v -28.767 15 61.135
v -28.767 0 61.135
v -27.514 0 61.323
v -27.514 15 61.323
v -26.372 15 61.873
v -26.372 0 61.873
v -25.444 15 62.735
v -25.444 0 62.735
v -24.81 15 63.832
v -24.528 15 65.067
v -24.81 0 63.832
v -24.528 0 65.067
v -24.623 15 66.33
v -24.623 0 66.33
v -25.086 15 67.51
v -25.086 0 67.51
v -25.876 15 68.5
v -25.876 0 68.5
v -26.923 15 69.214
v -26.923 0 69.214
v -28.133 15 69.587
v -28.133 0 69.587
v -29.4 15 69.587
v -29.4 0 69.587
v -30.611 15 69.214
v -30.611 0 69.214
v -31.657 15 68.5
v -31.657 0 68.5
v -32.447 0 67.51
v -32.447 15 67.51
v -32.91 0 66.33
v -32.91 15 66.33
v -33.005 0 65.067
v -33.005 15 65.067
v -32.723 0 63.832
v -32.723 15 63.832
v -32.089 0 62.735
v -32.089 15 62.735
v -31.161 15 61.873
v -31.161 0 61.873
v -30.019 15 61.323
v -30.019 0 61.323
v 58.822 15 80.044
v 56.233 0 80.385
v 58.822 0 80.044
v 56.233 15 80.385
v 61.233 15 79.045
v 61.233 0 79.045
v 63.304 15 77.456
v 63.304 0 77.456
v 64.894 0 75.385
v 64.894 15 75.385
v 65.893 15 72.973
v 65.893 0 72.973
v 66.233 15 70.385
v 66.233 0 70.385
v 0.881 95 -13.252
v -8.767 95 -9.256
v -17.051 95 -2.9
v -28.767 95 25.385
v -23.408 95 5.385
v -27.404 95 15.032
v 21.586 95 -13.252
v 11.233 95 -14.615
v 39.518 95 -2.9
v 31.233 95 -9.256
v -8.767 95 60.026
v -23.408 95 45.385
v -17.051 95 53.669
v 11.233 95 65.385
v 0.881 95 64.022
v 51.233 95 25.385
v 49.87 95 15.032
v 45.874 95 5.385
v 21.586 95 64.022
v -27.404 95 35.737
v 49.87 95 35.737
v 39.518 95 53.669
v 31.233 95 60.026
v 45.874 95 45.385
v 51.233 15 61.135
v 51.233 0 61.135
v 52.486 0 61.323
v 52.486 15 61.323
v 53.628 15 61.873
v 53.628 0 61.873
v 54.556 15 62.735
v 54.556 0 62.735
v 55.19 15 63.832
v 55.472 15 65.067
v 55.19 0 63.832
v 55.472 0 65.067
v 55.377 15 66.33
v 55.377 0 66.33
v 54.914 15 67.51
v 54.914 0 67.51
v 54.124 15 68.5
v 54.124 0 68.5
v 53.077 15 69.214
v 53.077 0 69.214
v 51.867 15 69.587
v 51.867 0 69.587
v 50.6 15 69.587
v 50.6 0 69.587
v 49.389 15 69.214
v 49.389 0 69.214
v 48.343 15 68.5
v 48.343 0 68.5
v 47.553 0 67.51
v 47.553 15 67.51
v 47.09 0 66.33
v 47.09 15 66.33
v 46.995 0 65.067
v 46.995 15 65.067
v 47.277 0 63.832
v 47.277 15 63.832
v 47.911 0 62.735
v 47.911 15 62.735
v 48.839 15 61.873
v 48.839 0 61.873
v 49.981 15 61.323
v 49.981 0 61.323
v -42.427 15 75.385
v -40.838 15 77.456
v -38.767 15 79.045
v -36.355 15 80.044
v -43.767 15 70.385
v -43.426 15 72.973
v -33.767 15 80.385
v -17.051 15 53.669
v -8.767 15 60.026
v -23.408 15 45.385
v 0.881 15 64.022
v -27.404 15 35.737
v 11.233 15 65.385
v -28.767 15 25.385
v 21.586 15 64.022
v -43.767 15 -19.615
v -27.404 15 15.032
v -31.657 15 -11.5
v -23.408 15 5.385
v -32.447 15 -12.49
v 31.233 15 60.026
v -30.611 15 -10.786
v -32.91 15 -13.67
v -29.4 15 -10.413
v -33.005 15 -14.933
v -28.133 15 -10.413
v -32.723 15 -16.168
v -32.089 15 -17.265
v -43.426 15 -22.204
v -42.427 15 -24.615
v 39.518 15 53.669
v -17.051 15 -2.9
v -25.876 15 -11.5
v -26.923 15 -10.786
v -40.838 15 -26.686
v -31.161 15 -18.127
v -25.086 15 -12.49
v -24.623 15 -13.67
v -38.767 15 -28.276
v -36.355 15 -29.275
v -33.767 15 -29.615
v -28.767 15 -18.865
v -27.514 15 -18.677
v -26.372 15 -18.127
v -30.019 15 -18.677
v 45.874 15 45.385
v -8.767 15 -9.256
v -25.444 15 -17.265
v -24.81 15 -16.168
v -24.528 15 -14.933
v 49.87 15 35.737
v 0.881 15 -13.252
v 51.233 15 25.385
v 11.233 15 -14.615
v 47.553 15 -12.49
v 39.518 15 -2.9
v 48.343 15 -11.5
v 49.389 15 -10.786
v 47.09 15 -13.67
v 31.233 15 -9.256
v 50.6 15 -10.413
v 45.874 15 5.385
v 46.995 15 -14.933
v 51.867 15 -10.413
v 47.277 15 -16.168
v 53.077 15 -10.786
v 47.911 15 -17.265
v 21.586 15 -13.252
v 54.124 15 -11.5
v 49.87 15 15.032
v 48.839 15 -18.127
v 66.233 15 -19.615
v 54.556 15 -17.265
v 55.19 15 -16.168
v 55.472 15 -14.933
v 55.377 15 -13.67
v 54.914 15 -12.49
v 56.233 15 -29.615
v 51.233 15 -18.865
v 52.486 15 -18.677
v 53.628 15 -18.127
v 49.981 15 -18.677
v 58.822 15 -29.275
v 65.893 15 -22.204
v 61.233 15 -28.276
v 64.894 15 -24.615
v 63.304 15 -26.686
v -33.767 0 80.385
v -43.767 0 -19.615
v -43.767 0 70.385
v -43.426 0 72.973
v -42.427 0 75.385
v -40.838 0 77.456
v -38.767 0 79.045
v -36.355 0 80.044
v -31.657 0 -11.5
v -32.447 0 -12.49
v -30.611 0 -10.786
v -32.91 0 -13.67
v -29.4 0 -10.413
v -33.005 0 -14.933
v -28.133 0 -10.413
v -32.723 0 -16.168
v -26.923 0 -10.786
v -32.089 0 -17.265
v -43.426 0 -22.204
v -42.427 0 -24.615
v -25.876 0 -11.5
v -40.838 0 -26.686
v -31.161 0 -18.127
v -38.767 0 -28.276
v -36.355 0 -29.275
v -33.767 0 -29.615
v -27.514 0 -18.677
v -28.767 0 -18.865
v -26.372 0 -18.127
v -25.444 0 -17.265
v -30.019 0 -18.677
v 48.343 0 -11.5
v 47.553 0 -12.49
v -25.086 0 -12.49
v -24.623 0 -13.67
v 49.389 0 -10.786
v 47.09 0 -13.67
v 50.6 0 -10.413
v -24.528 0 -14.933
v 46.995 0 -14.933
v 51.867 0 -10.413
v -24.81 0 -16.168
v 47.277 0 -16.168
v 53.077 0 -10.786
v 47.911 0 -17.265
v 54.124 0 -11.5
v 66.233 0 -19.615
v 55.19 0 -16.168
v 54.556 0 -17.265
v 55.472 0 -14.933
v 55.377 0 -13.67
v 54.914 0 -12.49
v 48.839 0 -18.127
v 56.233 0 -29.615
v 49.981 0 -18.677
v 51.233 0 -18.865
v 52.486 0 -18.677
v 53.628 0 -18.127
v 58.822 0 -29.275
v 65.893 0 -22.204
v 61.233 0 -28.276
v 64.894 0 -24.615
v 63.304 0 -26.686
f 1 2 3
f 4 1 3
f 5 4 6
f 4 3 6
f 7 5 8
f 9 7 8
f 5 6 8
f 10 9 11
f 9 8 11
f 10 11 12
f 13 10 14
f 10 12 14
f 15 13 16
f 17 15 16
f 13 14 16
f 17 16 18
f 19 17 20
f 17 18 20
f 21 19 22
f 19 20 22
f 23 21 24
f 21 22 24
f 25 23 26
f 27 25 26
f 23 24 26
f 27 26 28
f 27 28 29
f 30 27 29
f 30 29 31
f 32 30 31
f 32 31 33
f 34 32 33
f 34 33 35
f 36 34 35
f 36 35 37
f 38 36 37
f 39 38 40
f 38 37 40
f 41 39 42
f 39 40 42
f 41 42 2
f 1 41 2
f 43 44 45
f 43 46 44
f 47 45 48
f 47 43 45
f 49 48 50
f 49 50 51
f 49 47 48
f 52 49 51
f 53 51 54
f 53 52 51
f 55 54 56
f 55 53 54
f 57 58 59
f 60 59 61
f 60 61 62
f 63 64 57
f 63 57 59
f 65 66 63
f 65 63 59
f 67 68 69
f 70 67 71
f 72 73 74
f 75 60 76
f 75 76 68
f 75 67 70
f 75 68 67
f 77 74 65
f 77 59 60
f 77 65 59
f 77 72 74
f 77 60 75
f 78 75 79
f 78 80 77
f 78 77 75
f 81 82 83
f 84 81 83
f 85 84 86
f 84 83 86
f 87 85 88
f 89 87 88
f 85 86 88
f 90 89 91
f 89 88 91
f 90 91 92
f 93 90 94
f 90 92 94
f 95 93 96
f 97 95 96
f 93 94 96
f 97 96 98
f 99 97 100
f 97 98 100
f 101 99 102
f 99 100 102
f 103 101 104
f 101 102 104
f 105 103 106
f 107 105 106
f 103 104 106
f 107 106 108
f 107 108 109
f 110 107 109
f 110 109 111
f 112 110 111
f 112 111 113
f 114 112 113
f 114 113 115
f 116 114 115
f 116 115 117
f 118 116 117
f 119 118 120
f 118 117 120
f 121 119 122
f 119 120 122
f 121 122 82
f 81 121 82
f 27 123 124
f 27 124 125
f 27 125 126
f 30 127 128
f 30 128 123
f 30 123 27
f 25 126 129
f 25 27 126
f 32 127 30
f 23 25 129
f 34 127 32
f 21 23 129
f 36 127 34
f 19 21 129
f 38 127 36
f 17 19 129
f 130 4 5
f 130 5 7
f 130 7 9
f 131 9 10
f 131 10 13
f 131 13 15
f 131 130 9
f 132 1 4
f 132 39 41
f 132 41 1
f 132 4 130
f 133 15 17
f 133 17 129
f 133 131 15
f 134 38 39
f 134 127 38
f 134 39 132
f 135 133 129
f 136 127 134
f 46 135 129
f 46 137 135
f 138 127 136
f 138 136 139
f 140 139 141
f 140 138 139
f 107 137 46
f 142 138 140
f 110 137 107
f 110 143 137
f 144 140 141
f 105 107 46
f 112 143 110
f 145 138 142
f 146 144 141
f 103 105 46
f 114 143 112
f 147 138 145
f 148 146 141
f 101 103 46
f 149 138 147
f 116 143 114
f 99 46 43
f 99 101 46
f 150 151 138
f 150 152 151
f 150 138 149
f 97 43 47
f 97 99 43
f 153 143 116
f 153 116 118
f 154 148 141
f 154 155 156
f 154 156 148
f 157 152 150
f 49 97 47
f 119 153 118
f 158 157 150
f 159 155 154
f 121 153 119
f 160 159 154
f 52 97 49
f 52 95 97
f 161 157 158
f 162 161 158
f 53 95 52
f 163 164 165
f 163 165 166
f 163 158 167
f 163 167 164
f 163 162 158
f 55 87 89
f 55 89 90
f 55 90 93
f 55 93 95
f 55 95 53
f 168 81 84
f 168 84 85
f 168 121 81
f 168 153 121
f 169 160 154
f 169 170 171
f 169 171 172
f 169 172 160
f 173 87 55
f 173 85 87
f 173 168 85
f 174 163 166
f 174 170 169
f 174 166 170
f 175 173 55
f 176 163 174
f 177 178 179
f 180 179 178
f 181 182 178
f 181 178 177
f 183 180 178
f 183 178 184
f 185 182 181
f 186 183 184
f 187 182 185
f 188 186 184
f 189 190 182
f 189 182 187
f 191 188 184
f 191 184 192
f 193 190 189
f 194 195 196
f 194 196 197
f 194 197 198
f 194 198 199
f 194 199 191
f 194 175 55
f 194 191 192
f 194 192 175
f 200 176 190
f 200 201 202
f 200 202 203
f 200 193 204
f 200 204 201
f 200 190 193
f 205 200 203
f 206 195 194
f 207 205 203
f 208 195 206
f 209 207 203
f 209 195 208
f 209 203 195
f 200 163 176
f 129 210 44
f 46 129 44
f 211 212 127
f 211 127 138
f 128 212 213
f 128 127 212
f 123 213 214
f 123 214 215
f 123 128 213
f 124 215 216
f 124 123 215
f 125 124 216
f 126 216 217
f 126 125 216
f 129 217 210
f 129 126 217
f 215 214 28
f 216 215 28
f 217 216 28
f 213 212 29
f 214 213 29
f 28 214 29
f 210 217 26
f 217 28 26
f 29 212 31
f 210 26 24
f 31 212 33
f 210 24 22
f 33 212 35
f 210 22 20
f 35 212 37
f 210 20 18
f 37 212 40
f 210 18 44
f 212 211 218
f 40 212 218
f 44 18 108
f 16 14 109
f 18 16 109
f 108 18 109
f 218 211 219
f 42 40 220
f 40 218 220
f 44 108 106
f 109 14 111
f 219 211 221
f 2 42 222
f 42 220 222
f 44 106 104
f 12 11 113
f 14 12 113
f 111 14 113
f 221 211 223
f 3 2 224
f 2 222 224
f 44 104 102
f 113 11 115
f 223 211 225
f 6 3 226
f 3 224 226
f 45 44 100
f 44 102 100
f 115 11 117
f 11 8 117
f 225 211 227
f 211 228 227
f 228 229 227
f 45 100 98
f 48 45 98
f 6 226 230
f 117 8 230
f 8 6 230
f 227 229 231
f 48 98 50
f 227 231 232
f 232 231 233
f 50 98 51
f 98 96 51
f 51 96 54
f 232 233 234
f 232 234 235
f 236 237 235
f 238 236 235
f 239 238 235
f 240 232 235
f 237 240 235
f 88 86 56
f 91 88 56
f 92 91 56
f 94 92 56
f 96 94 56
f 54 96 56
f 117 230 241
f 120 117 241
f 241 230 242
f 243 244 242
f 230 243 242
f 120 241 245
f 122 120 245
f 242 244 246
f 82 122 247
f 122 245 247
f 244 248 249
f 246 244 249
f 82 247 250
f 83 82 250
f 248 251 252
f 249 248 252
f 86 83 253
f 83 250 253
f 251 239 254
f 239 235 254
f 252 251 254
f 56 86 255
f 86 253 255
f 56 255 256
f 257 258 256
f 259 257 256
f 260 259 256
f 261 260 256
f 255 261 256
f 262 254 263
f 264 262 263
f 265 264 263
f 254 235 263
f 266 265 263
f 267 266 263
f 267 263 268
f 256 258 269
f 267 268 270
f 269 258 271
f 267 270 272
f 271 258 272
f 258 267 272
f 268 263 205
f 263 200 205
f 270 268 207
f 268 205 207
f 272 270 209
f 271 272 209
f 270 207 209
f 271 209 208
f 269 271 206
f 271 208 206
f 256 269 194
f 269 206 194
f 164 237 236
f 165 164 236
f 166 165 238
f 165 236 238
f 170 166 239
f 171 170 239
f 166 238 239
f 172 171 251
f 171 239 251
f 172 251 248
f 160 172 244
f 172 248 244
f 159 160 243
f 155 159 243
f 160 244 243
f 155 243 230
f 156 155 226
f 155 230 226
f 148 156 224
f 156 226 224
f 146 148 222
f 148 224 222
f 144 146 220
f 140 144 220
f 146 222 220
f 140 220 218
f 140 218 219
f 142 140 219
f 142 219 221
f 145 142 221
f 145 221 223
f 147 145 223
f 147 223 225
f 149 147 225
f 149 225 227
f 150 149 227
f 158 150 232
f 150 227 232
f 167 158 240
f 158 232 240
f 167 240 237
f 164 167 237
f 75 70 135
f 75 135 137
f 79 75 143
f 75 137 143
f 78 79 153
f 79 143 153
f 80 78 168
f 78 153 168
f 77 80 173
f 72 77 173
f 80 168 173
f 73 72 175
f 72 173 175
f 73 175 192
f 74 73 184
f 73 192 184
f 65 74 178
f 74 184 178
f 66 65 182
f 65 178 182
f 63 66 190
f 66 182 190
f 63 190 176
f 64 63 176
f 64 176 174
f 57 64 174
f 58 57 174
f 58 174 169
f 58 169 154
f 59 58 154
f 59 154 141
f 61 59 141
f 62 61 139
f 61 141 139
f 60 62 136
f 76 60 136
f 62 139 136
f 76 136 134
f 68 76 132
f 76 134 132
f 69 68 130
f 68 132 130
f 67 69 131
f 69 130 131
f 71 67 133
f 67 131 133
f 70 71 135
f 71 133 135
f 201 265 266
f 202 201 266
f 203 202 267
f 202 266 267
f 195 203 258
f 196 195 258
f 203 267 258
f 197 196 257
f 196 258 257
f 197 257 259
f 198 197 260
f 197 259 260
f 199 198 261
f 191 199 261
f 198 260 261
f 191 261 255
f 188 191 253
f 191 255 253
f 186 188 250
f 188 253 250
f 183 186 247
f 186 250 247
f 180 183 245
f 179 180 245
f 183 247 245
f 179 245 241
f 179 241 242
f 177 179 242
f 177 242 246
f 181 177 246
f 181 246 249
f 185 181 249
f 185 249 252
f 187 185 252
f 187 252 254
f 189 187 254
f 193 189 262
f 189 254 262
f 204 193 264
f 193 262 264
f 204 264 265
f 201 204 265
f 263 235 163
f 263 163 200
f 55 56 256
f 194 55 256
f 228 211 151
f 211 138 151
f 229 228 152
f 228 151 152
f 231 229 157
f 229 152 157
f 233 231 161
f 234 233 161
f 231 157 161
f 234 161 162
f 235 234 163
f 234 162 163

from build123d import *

# Parameters (mm, degrees)
SKETCH1_W           = 110
SKETCH1_H           = 110
BOSS_EXTRUDE1_DEPTH = 15
SKETCH3_R           = 4.25
CUT_EXTRUDE1_DEPTH  = 15
FILLET1_R           = 10
SKETCH4_R           = 40
BOSS_EXTRUDE2_DEPTH = 80


with BuildPart() as part:
    # Sketch1 → Boss-Extrude1 (new body)
    with BuildSketch(Plane(origin=(0, 0, 0), x_dir=(1, 0, 0), z_dir=(0, 1, 0))):
        with Locations((11.233421751, -25.384615385)):
            Rectangle(SKETCH1_W, SKETCH1_H)
    extrude(amount=BOSS_EXTRUDE1_DEPTH)

    # Sketch3 → Cut-Extrude1 (cut)
    with BuildSketch(Plane(origin=(0, 0, 0), x_dir=(-1, 0, 0), z_dir=(0, -1, 0))):
        with Locations(Location((28.766578249, -65.384615385, 0), (0, 0, 90))):
            Circle(SKETCH3_R)
        with Locations(Location((-51.233421751, -65.384615385, 0), (0, 0, 90))):
            Circle(SKETCH3_R)
        with Locations(Location((-51.233421751, 14.615384615, 0), (0, 0, 90))):
            Circle(SKETCH3_R)
        with Locations(Location((28.766578249, 14.615384615, 0), (0, 0, 90))):
            Circle(SKETCH3_R)
    extrude(amount=-CUT_EXTRUDE1_DEPTH, mode=Mode.SUBTRACT)

    # Fillet1
    fillet1_edges = [part.edges().sort_by_distance(p)[0] for p in [
        (-43.766578249, 7.5, -29.615384615),
        (66.233421751, 7.5, -29.615384615),
        (66.233421751, 7.5, 80.384615385),
        (-43.766578249, 7.5, 80.384615385),
    ]]
    fillet(fillet1_edges, radius=FILLET1_R)

    # Sketch4 → Boss-Extrude2 (add)
    with BuildSketch(Plane(origin=(0, 15, 0), x_dir=(1, 0, 0), z_dir=(0, 1, 0))):
        with Locations(Location((11.233421751, -25.384615385, 0), (0, 0, 270))):
            Circle(SKETCH4_R)
    extrude(amount=BOSS_EXTRUDE2_DEPTH)


solid = part.part
